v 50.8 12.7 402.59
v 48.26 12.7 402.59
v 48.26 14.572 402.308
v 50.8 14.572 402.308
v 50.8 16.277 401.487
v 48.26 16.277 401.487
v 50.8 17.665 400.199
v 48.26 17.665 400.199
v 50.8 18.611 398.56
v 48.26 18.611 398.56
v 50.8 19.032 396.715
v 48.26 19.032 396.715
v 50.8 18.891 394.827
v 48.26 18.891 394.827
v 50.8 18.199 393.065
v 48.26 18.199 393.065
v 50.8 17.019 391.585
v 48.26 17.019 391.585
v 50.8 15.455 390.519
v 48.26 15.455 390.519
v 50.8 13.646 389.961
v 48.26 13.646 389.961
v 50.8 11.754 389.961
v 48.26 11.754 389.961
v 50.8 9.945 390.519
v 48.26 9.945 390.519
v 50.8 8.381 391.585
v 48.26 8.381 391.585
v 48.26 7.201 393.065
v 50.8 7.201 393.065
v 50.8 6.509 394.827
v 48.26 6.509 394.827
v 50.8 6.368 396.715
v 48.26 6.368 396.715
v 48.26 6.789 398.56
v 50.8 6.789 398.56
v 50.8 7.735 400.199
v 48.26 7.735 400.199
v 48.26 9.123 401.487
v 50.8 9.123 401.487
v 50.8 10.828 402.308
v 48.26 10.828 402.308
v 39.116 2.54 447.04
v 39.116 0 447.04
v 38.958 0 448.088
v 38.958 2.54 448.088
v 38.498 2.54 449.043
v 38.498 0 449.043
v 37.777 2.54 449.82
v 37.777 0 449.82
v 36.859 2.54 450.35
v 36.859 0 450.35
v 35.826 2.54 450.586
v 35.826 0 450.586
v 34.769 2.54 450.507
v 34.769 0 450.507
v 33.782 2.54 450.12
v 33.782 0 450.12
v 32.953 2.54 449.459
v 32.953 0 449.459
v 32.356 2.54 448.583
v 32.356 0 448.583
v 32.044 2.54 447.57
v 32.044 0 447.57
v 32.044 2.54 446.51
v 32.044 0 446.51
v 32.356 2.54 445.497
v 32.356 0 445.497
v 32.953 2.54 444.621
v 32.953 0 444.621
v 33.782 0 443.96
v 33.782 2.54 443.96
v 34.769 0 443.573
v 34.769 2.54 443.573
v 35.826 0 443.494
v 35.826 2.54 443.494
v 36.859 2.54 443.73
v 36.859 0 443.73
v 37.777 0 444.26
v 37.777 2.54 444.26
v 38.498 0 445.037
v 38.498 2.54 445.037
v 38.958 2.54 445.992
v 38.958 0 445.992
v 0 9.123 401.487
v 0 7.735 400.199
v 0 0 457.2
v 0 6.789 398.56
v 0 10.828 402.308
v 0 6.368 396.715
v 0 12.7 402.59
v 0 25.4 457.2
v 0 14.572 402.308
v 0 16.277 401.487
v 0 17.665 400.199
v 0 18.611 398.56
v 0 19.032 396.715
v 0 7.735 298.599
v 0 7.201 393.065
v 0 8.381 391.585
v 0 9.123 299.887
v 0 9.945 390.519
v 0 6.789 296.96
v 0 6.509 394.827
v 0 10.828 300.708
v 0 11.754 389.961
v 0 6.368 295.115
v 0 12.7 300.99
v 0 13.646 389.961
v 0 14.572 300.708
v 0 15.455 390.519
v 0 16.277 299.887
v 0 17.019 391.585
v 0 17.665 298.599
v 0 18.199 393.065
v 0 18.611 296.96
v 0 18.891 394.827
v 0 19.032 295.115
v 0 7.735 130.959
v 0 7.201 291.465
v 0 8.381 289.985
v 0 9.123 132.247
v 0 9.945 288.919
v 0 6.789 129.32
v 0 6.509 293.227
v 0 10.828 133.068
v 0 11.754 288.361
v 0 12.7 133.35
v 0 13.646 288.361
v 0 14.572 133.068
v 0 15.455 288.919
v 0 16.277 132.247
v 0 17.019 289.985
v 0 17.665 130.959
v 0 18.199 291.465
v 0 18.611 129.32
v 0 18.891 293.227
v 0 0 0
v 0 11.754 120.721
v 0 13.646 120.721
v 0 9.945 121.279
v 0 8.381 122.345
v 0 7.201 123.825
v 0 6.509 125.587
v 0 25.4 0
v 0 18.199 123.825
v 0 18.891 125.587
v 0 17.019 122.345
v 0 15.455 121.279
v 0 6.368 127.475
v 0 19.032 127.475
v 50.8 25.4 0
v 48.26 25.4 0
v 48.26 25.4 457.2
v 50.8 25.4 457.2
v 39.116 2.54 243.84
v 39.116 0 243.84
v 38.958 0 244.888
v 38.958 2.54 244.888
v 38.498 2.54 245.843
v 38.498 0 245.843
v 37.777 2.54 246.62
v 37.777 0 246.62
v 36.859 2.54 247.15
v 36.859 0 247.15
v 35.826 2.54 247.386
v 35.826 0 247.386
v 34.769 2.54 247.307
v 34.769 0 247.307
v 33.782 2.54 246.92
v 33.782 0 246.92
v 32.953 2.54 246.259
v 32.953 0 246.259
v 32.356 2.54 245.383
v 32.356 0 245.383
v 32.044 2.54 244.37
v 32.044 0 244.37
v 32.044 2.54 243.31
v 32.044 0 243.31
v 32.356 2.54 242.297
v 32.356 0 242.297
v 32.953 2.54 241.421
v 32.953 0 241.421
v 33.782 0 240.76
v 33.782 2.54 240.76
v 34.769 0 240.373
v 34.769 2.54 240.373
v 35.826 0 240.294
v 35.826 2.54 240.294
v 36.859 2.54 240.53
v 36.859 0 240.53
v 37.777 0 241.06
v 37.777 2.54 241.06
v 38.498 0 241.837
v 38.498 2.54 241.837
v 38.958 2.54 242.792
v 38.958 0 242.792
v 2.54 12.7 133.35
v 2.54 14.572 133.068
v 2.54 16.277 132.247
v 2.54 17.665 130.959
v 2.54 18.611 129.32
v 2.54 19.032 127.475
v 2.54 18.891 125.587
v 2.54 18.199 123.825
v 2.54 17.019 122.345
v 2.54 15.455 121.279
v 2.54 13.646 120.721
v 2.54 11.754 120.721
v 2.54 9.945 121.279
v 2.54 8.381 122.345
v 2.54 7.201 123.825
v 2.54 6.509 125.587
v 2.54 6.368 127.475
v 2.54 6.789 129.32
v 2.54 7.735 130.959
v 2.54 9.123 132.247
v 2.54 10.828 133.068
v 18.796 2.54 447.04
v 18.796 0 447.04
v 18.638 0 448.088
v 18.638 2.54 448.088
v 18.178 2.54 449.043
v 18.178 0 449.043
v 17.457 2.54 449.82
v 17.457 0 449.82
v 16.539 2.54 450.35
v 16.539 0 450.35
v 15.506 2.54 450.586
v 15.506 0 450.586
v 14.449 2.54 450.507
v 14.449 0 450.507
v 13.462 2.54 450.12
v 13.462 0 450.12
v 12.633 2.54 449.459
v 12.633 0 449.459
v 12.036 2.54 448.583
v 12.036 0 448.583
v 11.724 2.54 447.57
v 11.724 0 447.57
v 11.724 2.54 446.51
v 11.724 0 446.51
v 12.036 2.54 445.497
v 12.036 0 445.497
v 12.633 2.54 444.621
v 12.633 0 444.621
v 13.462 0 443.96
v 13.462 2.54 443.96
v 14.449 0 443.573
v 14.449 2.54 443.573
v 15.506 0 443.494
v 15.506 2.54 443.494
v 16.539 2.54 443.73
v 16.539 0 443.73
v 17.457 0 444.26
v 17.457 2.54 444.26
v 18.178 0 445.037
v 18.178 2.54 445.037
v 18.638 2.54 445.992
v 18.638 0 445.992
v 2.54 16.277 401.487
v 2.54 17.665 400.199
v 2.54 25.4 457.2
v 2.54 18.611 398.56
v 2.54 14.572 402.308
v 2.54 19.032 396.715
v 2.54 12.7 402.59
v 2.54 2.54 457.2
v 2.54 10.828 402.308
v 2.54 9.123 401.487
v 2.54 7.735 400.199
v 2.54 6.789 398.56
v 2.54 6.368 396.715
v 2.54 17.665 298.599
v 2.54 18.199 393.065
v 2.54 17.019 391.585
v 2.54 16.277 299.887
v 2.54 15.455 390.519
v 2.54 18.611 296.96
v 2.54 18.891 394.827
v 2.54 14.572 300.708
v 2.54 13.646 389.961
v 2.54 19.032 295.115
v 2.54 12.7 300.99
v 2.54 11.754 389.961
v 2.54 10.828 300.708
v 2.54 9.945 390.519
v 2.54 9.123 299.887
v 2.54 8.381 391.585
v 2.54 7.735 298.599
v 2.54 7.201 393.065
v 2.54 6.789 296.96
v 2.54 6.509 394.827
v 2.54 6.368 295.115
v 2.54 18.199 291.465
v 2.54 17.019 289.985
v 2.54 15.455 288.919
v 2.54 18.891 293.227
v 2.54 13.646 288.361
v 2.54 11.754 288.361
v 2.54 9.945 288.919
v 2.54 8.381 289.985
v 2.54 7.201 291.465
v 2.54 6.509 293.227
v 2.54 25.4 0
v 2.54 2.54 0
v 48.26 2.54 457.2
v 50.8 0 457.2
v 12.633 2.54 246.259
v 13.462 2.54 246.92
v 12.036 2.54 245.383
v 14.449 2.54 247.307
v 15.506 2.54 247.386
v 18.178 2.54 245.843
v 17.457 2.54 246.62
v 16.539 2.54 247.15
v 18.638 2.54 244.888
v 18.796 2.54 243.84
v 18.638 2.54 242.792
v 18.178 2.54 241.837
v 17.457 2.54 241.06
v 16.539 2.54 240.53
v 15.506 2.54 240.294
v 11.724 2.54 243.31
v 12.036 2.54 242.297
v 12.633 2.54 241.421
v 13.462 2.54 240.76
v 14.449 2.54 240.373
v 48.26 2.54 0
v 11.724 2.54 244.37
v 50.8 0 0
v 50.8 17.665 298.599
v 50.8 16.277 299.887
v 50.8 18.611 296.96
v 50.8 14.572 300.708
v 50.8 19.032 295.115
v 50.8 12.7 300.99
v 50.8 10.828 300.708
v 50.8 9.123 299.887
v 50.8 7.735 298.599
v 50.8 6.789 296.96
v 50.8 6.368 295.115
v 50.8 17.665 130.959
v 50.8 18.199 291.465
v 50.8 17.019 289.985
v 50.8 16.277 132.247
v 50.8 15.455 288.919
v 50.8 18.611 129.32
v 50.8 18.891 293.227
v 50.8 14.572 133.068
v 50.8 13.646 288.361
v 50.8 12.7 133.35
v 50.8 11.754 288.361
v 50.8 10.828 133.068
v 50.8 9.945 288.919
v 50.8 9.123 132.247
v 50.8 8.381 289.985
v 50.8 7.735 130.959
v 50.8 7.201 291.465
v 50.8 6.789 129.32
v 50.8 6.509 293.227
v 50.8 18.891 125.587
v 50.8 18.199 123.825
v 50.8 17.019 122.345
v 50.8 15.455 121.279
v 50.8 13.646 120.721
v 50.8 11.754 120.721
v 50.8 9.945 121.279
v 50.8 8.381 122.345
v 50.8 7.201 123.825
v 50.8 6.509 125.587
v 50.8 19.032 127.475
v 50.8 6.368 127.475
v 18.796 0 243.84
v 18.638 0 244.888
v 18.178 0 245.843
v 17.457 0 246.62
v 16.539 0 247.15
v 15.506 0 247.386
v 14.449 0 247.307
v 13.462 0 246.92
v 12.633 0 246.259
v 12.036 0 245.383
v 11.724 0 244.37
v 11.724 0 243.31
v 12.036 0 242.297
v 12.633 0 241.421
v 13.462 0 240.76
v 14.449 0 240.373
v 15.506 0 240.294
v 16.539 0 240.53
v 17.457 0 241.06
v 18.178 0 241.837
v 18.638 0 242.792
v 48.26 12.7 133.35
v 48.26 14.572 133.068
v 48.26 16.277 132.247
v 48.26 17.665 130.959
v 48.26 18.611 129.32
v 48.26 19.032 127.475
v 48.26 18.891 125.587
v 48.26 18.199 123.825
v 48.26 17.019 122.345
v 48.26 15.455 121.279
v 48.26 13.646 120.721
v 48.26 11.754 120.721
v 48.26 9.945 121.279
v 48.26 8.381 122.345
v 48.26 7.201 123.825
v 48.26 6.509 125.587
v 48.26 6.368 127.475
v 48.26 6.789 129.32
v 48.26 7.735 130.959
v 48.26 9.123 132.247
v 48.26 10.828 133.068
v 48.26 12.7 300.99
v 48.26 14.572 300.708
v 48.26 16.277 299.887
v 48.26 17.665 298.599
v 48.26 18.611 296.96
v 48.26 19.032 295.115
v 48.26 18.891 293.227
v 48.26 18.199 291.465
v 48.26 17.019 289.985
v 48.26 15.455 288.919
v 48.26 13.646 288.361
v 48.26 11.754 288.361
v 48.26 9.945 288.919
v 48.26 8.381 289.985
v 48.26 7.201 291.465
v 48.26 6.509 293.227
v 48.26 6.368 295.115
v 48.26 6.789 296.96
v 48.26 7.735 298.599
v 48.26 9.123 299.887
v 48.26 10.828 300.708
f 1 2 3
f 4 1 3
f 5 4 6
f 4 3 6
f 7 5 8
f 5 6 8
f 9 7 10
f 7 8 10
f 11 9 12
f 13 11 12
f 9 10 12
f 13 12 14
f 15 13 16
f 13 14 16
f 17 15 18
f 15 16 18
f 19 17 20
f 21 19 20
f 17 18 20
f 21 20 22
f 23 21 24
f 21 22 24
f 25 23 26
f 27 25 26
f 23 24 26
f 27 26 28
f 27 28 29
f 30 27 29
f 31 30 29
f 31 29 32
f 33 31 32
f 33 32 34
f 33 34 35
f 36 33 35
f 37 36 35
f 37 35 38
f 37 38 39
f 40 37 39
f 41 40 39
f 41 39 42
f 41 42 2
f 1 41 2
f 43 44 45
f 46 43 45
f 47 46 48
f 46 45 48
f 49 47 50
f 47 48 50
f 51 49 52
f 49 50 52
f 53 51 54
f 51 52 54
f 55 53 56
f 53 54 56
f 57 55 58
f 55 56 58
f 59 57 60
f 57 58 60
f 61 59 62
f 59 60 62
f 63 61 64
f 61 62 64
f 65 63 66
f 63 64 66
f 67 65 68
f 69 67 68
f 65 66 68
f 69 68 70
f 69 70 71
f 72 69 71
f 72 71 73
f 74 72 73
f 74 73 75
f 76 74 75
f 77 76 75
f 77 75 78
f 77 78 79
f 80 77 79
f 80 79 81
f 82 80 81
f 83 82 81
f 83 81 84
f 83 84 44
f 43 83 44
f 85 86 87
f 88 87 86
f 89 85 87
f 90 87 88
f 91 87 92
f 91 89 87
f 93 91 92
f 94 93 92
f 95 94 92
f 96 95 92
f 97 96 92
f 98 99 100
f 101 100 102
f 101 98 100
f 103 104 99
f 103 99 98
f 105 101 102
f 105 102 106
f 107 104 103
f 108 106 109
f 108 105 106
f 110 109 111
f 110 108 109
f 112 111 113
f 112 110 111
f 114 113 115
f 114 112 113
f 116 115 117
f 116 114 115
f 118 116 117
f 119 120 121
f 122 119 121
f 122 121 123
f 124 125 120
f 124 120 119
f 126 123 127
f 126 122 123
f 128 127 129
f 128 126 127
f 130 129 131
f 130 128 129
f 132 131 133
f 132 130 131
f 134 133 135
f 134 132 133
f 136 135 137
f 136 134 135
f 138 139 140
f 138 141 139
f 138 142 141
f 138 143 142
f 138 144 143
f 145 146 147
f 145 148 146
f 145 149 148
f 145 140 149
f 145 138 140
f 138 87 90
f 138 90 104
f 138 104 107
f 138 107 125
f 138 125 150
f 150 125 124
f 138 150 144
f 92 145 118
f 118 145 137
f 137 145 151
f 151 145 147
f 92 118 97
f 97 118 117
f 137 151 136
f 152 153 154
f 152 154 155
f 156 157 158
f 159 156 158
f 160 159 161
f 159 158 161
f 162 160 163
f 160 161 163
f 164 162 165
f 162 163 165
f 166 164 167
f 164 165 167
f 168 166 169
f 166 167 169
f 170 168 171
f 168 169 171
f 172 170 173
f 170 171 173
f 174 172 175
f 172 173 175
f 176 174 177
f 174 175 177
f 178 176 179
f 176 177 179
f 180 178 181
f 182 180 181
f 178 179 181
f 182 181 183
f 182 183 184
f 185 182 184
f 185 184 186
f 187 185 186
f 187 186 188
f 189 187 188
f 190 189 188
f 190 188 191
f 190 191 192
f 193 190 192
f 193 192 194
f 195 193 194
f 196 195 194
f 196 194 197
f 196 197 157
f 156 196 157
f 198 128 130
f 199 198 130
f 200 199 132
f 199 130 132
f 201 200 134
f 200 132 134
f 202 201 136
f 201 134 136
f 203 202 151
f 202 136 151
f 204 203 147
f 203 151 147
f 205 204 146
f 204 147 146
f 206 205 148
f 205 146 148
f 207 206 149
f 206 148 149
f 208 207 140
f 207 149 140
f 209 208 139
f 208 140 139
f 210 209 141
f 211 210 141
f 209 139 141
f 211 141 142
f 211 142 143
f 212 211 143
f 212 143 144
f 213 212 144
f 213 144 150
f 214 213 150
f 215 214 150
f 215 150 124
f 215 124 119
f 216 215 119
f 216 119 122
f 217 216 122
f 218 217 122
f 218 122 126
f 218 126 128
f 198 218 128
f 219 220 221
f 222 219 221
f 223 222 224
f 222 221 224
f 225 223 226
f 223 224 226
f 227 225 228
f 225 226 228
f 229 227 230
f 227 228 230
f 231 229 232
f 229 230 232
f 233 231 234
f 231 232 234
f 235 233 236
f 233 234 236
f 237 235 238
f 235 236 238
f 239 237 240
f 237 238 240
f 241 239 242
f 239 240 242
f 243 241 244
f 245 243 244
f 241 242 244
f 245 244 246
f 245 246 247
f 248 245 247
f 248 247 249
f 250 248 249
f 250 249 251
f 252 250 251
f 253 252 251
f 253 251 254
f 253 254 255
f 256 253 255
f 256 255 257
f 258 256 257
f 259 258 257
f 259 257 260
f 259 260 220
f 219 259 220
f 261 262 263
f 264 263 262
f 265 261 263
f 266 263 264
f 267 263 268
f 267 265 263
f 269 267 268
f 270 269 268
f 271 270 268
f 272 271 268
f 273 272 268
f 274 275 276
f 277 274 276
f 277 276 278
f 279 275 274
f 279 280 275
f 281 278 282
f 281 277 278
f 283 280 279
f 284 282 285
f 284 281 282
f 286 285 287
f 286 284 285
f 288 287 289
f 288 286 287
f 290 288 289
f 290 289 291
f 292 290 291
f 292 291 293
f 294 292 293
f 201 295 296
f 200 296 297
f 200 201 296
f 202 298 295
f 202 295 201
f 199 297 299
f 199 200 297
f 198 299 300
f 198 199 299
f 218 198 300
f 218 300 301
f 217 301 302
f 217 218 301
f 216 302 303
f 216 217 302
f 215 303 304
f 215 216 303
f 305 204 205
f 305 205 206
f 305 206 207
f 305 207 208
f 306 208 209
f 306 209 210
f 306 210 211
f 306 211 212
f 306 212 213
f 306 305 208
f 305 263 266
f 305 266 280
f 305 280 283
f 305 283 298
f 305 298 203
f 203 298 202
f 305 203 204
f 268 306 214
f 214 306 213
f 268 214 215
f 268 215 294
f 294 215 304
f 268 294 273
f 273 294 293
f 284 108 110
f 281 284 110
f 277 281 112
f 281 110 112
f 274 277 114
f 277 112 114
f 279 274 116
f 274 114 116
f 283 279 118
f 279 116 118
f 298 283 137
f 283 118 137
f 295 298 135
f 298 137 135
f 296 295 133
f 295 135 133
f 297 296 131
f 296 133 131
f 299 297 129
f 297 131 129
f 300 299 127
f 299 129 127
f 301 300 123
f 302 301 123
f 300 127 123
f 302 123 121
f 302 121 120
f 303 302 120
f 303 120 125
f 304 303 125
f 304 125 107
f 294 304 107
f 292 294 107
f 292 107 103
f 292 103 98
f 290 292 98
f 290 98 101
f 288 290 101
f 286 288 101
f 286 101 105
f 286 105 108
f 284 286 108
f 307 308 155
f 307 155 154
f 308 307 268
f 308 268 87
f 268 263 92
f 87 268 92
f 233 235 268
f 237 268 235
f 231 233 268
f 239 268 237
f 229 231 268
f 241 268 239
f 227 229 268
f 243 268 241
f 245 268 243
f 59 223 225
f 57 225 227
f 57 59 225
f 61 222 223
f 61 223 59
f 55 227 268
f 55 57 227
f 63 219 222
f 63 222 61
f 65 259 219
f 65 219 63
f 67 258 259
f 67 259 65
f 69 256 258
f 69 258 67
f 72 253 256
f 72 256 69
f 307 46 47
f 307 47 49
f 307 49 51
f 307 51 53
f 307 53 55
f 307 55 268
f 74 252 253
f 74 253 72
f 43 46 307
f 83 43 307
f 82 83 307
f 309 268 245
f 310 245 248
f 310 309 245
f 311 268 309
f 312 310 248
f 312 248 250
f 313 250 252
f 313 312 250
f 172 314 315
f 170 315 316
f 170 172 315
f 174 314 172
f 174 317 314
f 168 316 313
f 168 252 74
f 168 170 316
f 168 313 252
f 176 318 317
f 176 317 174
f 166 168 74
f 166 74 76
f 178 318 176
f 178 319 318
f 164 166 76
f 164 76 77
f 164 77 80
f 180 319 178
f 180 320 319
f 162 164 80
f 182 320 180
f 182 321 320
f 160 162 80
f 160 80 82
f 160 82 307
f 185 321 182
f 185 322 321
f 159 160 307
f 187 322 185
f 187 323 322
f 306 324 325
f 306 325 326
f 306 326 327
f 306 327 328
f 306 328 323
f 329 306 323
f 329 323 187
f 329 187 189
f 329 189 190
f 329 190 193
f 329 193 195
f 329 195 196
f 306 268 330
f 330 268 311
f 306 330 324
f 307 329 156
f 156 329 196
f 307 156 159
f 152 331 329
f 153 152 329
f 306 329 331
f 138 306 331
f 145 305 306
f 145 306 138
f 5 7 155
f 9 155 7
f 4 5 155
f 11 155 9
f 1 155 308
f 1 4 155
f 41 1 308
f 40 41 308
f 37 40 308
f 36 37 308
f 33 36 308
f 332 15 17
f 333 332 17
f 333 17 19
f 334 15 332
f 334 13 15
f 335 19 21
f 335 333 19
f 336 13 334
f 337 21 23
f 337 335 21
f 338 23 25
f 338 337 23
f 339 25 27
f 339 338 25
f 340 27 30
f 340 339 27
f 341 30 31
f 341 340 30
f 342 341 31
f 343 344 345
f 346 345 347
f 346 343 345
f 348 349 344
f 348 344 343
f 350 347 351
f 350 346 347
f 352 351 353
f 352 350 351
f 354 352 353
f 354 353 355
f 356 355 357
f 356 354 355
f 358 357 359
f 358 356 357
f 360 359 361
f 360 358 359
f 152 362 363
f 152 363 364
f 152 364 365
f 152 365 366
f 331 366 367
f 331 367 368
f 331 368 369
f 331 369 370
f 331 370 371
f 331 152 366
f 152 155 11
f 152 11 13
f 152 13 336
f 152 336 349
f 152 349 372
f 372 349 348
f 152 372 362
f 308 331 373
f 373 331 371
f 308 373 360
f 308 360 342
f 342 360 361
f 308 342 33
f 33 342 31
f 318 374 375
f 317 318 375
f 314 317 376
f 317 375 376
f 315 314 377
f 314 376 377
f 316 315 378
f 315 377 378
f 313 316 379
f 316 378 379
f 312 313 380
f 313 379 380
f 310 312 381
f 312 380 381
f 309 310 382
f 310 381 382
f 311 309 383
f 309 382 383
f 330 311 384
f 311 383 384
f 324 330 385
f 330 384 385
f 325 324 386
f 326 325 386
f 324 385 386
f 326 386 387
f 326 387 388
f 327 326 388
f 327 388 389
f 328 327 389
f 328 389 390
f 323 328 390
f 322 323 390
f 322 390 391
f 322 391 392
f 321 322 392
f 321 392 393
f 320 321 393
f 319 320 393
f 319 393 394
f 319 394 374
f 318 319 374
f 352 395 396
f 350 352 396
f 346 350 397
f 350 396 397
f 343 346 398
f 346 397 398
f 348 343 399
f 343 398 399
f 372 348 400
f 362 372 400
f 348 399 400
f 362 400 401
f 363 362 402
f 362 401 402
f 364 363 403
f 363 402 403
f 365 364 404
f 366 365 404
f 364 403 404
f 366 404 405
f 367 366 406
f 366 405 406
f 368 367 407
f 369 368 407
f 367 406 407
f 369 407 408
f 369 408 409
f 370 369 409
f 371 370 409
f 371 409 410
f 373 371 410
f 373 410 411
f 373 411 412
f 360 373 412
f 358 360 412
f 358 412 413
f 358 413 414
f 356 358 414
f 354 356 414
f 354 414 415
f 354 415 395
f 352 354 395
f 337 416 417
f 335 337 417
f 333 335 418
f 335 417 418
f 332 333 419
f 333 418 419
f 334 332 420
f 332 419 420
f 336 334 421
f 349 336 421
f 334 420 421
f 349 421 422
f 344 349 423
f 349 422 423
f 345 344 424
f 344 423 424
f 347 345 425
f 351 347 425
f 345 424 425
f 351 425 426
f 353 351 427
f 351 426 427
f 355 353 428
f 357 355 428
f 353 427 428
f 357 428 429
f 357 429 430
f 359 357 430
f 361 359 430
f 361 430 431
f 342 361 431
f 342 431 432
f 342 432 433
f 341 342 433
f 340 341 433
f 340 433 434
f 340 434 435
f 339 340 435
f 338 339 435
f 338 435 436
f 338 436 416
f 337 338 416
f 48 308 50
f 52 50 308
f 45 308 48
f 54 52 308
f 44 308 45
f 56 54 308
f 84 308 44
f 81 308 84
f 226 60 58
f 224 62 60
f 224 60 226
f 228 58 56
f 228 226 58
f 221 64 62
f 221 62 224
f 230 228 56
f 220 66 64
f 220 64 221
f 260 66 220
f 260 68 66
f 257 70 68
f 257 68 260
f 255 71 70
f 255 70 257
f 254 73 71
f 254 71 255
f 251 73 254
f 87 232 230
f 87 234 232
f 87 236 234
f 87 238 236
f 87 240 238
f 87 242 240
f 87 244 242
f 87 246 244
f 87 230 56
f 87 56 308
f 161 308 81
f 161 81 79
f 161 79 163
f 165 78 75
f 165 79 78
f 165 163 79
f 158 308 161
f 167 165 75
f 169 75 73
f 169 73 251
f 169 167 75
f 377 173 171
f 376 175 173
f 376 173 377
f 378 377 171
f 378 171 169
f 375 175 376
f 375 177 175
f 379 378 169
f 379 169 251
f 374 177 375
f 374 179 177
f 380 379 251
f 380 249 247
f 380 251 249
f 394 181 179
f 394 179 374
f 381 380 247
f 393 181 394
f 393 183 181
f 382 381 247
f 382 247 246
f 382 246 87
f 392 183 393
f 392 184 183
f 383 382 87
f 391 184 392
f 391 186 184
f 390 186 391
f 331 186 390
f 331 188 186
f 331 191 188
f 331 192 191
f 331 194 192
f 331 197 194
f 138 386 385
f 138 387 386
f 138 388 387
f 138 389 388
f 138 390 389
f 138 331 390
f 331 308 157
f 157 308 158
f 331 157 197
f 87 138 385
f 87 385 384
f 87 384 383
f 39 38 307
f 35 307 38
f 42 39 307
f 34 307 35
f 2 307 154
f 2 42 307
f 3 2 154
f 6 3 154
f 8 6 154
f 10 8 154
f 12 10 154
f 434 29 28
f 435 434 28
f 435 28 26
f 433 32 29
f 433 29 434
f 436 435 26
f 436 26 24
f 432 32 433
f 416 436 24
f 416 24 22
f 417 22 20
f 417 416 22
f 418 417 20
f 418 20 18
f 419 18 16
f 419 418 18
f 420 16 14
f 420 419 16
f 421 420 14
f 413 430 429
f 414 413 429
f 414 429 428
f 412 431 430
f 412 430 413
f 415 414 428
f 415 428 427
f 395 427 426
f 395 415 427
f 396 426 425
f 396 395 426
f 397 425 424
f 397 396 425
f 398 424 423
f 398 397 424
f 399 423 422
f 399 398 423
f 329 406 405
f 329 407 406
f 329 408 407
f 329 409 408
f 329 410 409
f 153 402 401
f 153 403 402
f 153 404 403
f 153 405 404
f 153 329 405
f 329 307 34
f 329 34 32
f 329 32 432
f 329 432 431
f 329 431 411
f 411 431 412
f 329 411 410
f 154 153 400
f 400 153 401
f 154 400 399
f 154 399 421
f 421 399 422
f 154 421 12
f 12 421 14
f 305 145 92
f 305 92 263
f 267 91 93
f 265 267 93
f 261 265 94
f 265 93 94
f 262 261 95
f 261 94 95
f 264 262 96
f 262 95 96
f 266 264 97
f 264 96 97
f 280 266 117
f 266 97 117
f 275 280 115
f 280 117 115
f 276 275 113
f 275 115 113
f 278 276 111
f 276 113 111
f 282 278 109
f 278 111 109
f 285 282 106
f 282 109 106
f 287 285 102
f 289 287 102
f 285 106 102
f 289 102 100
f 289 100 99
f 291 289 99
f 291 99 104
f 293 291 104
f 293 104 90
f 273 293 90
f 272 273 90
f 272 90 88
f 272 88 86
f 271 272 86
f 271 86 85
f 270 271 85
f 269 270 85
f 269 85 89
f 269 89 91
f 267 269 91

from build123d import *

# Parameters (mm, degrees)
BOSS_EXTRUDE1_DEPTH = 457.2
CUT_EXTRUDE1_REACH  = 27.4
SKETCH2_R           = 3.556
CUT_EXTRUDE2_REACH  = 27.4
SKETCH3_R           = 3.556
SKETCH4_R           = 6.35
CUT_EXTRUDE3_DEPTH  = 51.8


with BuildPart() as part:
    # Sketch1 → Boss-Extrude1 (new body)
    with BuildSketch(Plane.XY):
        Polygon((48.26, 2.54), (48.26, 25.4), (50.8, 25.4), (50.8, 0), (0, 0), (0, 25.4), (2.54, 25.4), (2.54, 2.54), align=None)
    extrude(amount=BOSS_EXTRUDE1_DEPTH)

    # Sketch2 → Cut-Extrude1 (cut, up to next)
    with BuildSketch(Plane.XZ, mode=Mode.PRIVATE) as cut_extrude1_sk1:
        with Locations((15.24, 447.04)):
            Circle(SKETCH2_R)
    cut_extrude1_tool1 = extrude(cut_extrude1_sk1.sketch, amount=-CUT_EXTRUDE1_REACH, mode=Mode.PRIVATE) & part.part
    add(cut_extrude1_tool1.solids().sort_by_distance((15.24, 0, 447.04))[0], mode=Mode.SUBTRACT)
    # Sketch2 → Cut-Extrude1 (cut, up to next)
    with BuildSketch(Plane.XZ, mode=Mode.PRIVATE) as cut_extrude1_sk2:
        with Locations((35.56, 447.04)):
            Circle(SKETCH2_R)
    cut_extrude1_tool2 = extrude(cut_extrude1_sk2.sketch, amount=-CUT_EXTRUDE1_REACH, mode=Mode.PRIVATE) & part.part
    add(cut_extrude1_tool2.solids().sort_by_distance((35.56, 0, 447.04))[0], mode=Mode.SUBTRACT)

    # Sketch3 → Cut-Extrude2 (cut, up to next)
    with BuildSketch(Plane.XZ, mode=Mode.PRIVATE) as cut_extrude2_sk1:
        with Locations((15.24, 243.84)):
            Circle(SKETCH3_R)
    cut_extrude2_tool1 = extrude(cut_extrude2_sk1.sketch, amount=-CUT_EXTRUDE2_REACH, mode=Mode.PRIVATE) & part.part
    add(cut_extrude2_tool1.solids().sort_by_distance((15.24, 0, 243.84))[0], mode=Mode.SUBTRACT)
    # Sketch3 → Cut-Extrude2 (cut, up to next)
    with BuildSketch(Plane.XZ, mode=Mode.PRIVATE) as cut_extrude2_sk2:
        with Locations((35.56, 243.84)):
            Circle(SKETCH3_R)
    cut_extrude2_tool2 = extrude(cut_extrude2_sk2.sketch, amount=-CUT_EXTRUDE2_REACH, mode=Mode.PRIVATE) & part.part
    add(cut_extrude2_tool2.solids().sort_by_distance((35.56, 0, 243.84))[0], mode=Mode.SUBTRACT)

    # Sketch4 → Cut-Extrude3 (cut, through all)
    with BuildSketch(Plane.ZY):
        with Locations((396.24, 12.7)):
            Circle(SKETCH4_R)
        with Locations((294.64, 12.7)):
            Circle(SKETCH4_R)
        with Locations((127, 12.7)):
            Circle(SKETCH4_R)
    extrude(amount=-CUT_EXTRUDE3_DEPTH, mode=Mode.SUBTRACT)


solid = part.part
